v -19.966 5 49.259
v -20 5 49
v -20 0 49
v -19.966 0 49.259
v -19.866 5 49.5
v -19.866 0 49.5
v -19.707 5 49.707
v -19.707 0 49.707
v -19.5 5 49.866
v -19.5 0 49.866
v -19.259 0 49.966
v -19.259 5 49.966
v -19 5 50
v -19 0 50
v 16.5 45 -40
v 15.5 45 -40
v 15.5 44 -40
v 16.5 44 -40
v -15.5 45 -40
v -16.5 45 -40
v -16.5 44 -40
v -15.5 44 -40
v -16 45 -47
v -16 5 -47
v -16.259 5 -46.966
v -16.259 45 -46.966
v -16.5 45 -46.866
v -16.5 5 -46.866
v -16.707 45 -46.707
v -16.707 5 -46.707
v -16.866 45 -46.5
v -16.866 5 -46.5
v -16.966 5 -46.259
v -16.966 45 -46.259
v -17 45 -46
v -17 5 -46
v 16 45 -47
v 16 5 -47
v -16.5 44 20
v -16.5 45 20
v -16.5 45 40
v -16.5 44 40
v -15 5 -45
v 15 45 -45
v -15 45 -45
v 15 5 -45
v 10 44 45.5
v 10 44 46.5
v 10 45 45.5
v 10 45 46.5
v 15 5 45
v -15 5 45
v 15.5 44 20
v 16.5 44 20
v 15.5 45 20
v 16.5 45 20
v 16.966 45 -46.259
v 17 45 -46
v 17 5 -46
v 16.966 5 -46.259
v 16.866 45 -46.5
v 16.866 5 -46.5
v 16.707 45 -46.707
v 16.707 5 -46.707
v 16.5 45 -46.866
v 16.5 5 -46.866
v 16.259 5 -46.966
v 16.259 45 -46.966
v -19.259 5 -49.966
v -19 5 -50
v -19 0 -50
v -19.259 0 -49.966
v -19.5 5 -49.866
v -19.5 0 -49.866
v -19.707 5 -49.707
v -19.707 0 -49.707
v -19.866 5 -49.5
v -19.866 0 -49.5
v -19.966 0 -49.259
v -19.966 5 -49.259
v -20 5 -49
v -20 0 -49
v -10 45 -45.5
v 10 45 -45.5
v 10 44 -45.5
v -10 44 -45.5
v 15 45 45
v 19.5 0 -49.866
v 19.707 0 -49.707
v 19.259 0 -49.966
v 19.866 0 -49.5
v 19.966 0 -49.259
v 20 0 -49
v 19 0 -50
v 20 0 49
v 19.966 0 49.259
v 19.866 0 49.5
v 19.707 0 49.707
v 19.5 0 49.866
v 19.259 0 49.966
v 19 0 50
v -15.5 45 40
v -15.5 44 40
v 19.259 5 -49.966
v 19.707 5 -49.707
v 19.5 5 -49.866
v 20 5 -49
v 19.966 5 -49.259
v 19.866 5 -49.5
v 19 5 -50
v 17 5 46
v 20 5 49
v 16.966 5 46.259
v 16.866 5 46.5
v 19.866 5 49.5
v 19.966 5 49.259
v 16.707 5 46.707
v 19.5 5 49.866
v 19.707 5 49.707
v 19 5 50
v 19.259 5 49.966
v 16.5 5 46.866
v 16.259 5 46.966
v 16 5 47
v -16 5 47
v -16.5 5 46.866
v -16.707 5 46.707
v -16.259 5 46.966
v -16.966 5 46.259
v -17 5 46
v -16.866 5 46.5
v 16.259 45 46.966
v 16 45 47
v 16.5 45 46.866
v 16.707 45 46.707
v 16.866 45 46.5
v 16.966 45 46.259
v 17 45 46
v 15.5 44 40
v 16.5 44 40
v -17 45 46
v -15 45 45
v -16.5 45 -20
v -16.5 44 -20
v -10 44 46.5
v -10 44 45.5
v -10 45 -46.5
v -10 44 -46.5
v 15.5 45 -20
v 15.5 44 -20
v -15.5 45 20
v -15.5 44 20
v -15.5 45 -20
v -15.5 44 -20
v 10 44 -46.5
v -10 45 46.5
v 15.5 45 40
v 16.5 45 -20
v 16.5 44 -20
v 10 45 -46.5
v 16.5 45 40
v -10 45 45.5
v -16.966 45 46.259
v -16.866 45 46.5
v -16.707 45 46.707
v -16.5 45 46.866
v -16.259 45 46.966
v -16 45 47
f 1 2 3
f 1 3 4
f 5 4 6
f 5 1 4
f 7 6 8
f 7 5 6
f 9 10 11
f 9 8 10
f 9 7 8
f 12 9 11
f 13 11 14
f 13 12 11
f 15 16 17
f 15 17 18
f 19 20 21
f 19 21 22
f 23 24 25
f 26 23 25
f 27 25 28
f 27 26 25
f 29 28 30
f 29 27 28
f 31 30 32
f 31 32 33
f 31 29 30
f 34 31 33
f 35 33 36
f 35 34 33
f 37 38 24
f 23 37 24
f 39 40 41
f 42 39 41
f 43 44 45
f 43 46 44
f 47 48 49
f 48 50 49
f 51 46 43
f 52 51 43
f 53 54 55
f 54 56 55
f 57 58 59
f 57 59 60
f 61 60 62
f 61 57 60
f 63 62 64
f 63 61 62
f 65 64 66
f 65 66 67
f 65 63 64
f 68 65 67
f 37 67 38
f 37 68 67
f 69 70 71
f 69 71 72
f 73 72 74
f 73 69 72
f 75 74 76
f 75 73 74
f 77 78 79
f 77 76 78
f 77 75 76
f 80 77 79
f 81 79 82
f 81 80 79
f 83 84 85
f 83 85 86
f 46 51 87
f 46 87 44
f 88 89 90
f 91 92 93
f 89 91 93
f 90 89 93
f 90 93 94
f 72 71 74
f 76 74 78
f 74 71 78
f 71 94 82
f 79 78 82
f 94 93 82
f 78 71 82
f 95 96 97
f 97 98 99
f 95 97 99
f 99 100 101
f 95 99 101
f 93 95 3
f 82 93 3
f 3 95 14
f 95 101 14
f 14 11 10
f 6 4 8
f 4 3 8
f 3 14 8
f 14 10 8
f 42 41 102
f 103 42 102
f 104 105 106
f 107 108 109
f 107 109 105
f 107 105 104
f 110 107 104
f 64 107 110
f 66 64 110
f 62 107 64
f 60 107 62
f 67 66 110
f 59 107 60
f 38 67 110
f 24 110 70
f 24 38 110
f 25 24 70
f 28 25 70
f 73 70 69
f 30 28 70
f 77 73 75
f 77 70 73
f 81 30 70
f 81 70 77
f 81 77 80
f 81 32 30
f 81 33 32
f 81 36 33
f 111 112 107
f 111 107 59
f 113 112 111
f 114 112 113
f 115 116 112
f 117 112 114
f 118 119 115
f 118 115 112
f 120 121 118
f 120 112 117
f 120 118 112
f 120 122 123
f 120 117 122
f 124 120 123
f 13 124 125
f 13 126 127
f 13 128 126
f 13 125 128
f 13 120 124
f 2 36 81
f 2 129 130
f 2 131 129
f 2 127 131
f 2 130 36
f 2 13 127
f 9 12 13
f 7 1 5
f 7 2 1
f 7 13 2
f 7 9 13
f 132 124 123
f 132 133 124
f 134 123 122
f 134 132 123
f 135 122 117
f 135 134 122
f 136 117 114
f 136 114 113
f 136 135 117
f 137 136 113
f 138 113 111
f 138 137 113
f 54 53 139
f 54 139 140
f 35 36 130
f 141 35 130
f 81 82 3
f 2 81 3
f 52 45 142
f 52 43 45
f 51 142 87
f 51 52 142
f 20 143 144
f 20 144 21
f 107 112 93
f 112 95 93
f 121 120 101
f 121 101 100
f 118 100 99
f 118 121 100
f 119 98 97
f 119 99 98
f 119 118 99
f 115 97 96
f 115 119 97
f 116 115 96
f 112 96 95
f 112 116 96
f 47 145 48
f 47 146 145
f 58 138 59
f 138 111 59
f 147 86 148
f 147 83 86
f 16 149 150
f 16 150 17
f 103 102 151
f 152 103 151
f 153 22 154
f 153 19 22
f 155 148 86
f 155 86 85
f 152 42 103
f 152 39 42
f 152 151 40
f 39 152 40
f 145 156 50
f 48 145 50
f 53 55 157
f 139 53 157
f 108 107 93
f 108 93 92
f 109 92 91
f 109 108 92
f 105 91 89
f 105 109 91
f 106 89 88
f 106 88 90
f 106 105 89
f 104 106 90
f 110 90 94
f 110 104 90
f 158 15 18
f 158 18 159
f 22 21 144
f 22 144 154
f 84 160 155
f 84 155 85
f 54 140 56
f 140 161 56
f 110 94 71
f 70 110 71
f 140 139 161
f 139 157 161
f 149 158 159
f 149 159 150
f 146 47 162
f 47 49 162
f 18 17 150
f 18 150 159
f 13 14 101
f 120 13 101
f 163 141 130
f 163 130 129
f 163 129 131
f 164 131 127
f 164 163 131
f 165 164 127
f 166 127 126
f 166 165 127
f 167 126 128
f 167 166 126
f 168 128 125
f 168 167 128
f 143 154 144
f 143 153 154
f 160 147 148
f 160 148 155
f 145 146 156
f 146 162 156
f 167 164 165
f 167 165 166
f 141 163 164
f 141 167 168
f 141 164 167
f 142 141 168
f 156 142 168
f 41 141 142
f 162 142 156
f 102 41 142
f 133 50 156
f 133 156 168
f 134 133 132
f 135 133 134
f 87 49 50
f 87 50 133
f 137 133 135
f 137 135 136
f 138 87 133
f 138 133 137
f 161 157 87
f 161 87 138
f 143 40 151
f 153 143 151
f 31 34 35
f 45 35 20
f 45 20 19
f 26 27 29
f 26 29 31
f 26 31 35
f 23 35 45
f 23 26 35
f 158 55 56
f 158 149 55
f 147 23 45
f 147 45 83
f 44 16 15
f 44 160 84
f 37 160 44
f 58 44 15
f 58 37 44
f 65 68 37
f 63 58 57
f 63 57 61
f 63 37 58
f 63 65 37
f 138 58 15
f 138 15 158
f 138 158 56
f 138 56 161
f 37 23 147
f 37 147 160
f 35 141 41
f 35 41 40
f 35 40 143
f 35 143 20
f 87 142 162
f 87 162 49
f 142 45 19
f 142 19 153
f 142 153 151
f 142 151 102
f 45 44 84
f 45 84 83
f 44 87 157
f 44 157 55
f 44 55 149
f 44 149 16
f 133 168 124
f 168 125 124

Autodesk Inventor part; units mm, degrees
ref_plane "YZ Plane" through (0, 0, 0) normal (1, 0, 0) x (0, 1, 0)
ref_plane "XZ Plane" through (0, 0, 0) normal (0, 1, 0) x (-1, 0, 0)
ref_plane "XY Plane" through (0, 0, 0) normal (0, 0, 1) x (1, 0, 0)
sketch "Sketch1" plane through (0, 0, 0) normal (0, 1, 0) x (-1, 0, 0)
  line L0 (-20, -50) -> (20, -50)
  line L1 (20, -50) -> (20, 50)
  line L2 (20, 50) -> (-20, 50)
  line L3 (-20, 50) -> (-20, -50)
  line L4 (-20, -50) -> (20, 50) construction
  line L5 (20, -50) -> (-20, 50) construction
  point P0 (0, 0)
  dimension "d2" = 40
  dimension "d3" = 100
extrude "Extrusion1" add sketch "Sketch1" along normal blind 5
sketch "Sketch2" plane through (0, 5, 0) normal (0, 1, 0) x (1, 0, 0)
  line L0 (-20, 50) -> (-20, -50) projected
  line L1 (-20, -50) -> (20, -50) projected
  line L2 (20, -50) -> (20, 50) projected
  line L3 (20, 50) -> (-20, 50) projected
  line L4 (17, 47) -> (-17, 47)
  line L5 (-17, 47) -> (-17, -47)
  line L6 (-17, -47) -> (17, -47)
  line L7 (17, -47) -> (17, 47)
  line L8 (17, 47) -> (-17, -47) construction
  line L9 (-17, 47) -> (17, -47) construction
  line L10 (15, 45) -> (-15, 45)
  line L11 (-15, 45) -> (-15, -45)
  line L12 (-15, -45) -> (15, -45)
  line L13 (15, -45) -> (15, 45)
  line L14 (15, 45) -> (-15, -45) construction
  line L15 (-15, 45) -> (15, -45) construction
  point P0 (0, 0)
  dimension "d6" = 3
  dimension "d7" = 2
  dimension "d52" = 3
  dimension "d53" = 2
extrude "Extrusion2" add sketch "Sketch2" along normal blind 40 contours L7 L6 L5 L4
fillet "Fillet1" radius 1 1 edges at (20, 2.5, 50)
fillet "Fillet2" radius 1 1 edges at (20, 2.5, -50)
fillet "Fillet3" radius 1 1 edges at (-20, 2.5, 50)
fillet "Fillet4" radius 1 1 edges at (-20, 2.5, -50)
fillet "Fillet5" radius 1 1 edges at (-17, 25, 47)
fillet "Fillet6" radius 1 1 edges at (17, 25, 47)
fillet "Fillet7" radius 1 1 edges at (17, 25, -47)
fillet "Fillet8" radius 1 1 edges at (-17, 25, -47)
sketch "Sketch3" plane through (0, 45, 0) normal (0, 1, 0) x (1, 0, 0)
  arc A0 (-16, 47) -> (-17, 46) centre (-16, 46) ccw projected
  line L0 (-17, 46) -> (-17, -46) projected
  arc A1 (-17, -46) -> (-16, -47) centre (-16, -46) ccw projected
  line L1 (-16, -47) -> (16, -47) projected
  arc A2 (16, -47) -> (17, -46) centre (16, -46) ccw projected
  line L2 (17, -46) -> (17, 46) projected
  arc A3 (17, 46) -> (16, 47) centre (16, 46) ccw projected
  line L3 (16, 47) -> (-16, 47) projected
  line L4 (15, 45) -> (15, -45) projected
  line L5 (15, -45) -> (-15, -45) projected
  line L6 (-15, -45) -> (-15, 45) projected
  line L7 (-15, 45) -> (15, 45) projected
  line L8 (-16.5, -40) -> (-15.5, -40)
  line L9 (-15.5, -40) -> (-15.5, -20)
  line L10 (-15.5, -20) -> (-16.5, -20)
  line L11 (-16.5, -20) -> (-16.5, -40)
  line L12 (-16.5, 40) -> (-15.5, 40)
  line L13 (-15.5, 40) -> (-15.5, 20)
  line L14 (-15.5, 20) -> (-16.5, 20)
  line L15 (-16.5, 20) -> (-16.5, 40)
  line L16 (-10, 46.5) -> (10, 46.5)
  line L17 (10, 46.5) -> (10, 45.5)
  line L18 (10, 45.5) -> (-10, 45.5)
  line L19 (-10, 45.5) -> (-10, 46.5)
  line L20 (10, 46.5) -> (-10, 46.5)
  line L21 (-10, 46.5) -> (-10, 45.5)
  line L22 (-10, 45.5) -> (10, 45.5)
  line L23 (10, 45.5) -> (10, 46.5)
  line L24 (15.5, 40) -> (16.5, 40)
  line L25 (16.5, 40) -> (16.5, 20)
  line L26 (16.5, 20) -> (15.5, 20)
  line L27 (15.5, 20) -> (15.5, 40)
  line L28 (15.5, -40) -> (16.5, -40)
  line L29 (16.5, -40) -> (16.5, -20)
  line L30 (16.5, -20) -> (15.5, -20)
  line L31 (15.5, -20) -> (15.5, -40)
  line L32 (10, -45.5) -> (-10, -45.5)
  line L33 (-10, -45.5) -> (-10, -46.5)
  line L34 (-10, -46.5) -> (10, -46.5)
  line L35 (10, -46.5) -> (10, -45.5)
  line L36 (-10, -45.5) -> (10, -45.5)
  line L37 (10, -45.5) -> (10, -46.5)
  line L38 (10, -46.5) -> (-10, -46.5)
  line L39 (-10, -46.5) -> (-10, -45.5)
  point P0 (0, 0)
  point P1 (-16, 40)
  point P2 (-16, 20)
  point P3 (16, 40)
  dimension "d18" = 1
  dimension "d19" = 20
  dimension "d20" = 0.5
  dimension "d21" = 7
  dimension "d22" = 7
  dimension "d23" = 0.5
  dimension "d24" = 1
  dimension "d25" = 20
  dimension "d26" = 20
  dimension "d27" = 1
  dimension "d28" = 0.5
  dimension "d29" = 7
  dimension "d30" = 20
  dimension "d31" = 1
  dimension "d32" = 0.5
  dimension "d33" = 7
  dimension "d34" = 1
  dimension "d35" = 20
  dimension "d36" = 0.5
  dimension "d37" = 7
  dimension "d38" = 1
  dimension "d39" = 20
  dimension "d40" = 7
  dimension "d41" = 0.5
  dimension "d42" = 20
  dimension "d43" = 1
  dimension "d44" = 0.5
  dimension "d45" = 7
  dimension "d46" = 20
  dimension "d47" = 1
  dimension "d48" = 0.5
  dimension "d49" = 7
extrude "Extrusion3" cut sketch "Sketch3" against normal blind 1 contours L11 L10 L9 L8 | L12 L13 L14 L15 | L16 L17 L18 L19 | L24 L25 L26 L27 | L31 L30 L29 L28 | L35 L34 L33 L32
properties part number "block_main" material "PC/ABS Plastic"
